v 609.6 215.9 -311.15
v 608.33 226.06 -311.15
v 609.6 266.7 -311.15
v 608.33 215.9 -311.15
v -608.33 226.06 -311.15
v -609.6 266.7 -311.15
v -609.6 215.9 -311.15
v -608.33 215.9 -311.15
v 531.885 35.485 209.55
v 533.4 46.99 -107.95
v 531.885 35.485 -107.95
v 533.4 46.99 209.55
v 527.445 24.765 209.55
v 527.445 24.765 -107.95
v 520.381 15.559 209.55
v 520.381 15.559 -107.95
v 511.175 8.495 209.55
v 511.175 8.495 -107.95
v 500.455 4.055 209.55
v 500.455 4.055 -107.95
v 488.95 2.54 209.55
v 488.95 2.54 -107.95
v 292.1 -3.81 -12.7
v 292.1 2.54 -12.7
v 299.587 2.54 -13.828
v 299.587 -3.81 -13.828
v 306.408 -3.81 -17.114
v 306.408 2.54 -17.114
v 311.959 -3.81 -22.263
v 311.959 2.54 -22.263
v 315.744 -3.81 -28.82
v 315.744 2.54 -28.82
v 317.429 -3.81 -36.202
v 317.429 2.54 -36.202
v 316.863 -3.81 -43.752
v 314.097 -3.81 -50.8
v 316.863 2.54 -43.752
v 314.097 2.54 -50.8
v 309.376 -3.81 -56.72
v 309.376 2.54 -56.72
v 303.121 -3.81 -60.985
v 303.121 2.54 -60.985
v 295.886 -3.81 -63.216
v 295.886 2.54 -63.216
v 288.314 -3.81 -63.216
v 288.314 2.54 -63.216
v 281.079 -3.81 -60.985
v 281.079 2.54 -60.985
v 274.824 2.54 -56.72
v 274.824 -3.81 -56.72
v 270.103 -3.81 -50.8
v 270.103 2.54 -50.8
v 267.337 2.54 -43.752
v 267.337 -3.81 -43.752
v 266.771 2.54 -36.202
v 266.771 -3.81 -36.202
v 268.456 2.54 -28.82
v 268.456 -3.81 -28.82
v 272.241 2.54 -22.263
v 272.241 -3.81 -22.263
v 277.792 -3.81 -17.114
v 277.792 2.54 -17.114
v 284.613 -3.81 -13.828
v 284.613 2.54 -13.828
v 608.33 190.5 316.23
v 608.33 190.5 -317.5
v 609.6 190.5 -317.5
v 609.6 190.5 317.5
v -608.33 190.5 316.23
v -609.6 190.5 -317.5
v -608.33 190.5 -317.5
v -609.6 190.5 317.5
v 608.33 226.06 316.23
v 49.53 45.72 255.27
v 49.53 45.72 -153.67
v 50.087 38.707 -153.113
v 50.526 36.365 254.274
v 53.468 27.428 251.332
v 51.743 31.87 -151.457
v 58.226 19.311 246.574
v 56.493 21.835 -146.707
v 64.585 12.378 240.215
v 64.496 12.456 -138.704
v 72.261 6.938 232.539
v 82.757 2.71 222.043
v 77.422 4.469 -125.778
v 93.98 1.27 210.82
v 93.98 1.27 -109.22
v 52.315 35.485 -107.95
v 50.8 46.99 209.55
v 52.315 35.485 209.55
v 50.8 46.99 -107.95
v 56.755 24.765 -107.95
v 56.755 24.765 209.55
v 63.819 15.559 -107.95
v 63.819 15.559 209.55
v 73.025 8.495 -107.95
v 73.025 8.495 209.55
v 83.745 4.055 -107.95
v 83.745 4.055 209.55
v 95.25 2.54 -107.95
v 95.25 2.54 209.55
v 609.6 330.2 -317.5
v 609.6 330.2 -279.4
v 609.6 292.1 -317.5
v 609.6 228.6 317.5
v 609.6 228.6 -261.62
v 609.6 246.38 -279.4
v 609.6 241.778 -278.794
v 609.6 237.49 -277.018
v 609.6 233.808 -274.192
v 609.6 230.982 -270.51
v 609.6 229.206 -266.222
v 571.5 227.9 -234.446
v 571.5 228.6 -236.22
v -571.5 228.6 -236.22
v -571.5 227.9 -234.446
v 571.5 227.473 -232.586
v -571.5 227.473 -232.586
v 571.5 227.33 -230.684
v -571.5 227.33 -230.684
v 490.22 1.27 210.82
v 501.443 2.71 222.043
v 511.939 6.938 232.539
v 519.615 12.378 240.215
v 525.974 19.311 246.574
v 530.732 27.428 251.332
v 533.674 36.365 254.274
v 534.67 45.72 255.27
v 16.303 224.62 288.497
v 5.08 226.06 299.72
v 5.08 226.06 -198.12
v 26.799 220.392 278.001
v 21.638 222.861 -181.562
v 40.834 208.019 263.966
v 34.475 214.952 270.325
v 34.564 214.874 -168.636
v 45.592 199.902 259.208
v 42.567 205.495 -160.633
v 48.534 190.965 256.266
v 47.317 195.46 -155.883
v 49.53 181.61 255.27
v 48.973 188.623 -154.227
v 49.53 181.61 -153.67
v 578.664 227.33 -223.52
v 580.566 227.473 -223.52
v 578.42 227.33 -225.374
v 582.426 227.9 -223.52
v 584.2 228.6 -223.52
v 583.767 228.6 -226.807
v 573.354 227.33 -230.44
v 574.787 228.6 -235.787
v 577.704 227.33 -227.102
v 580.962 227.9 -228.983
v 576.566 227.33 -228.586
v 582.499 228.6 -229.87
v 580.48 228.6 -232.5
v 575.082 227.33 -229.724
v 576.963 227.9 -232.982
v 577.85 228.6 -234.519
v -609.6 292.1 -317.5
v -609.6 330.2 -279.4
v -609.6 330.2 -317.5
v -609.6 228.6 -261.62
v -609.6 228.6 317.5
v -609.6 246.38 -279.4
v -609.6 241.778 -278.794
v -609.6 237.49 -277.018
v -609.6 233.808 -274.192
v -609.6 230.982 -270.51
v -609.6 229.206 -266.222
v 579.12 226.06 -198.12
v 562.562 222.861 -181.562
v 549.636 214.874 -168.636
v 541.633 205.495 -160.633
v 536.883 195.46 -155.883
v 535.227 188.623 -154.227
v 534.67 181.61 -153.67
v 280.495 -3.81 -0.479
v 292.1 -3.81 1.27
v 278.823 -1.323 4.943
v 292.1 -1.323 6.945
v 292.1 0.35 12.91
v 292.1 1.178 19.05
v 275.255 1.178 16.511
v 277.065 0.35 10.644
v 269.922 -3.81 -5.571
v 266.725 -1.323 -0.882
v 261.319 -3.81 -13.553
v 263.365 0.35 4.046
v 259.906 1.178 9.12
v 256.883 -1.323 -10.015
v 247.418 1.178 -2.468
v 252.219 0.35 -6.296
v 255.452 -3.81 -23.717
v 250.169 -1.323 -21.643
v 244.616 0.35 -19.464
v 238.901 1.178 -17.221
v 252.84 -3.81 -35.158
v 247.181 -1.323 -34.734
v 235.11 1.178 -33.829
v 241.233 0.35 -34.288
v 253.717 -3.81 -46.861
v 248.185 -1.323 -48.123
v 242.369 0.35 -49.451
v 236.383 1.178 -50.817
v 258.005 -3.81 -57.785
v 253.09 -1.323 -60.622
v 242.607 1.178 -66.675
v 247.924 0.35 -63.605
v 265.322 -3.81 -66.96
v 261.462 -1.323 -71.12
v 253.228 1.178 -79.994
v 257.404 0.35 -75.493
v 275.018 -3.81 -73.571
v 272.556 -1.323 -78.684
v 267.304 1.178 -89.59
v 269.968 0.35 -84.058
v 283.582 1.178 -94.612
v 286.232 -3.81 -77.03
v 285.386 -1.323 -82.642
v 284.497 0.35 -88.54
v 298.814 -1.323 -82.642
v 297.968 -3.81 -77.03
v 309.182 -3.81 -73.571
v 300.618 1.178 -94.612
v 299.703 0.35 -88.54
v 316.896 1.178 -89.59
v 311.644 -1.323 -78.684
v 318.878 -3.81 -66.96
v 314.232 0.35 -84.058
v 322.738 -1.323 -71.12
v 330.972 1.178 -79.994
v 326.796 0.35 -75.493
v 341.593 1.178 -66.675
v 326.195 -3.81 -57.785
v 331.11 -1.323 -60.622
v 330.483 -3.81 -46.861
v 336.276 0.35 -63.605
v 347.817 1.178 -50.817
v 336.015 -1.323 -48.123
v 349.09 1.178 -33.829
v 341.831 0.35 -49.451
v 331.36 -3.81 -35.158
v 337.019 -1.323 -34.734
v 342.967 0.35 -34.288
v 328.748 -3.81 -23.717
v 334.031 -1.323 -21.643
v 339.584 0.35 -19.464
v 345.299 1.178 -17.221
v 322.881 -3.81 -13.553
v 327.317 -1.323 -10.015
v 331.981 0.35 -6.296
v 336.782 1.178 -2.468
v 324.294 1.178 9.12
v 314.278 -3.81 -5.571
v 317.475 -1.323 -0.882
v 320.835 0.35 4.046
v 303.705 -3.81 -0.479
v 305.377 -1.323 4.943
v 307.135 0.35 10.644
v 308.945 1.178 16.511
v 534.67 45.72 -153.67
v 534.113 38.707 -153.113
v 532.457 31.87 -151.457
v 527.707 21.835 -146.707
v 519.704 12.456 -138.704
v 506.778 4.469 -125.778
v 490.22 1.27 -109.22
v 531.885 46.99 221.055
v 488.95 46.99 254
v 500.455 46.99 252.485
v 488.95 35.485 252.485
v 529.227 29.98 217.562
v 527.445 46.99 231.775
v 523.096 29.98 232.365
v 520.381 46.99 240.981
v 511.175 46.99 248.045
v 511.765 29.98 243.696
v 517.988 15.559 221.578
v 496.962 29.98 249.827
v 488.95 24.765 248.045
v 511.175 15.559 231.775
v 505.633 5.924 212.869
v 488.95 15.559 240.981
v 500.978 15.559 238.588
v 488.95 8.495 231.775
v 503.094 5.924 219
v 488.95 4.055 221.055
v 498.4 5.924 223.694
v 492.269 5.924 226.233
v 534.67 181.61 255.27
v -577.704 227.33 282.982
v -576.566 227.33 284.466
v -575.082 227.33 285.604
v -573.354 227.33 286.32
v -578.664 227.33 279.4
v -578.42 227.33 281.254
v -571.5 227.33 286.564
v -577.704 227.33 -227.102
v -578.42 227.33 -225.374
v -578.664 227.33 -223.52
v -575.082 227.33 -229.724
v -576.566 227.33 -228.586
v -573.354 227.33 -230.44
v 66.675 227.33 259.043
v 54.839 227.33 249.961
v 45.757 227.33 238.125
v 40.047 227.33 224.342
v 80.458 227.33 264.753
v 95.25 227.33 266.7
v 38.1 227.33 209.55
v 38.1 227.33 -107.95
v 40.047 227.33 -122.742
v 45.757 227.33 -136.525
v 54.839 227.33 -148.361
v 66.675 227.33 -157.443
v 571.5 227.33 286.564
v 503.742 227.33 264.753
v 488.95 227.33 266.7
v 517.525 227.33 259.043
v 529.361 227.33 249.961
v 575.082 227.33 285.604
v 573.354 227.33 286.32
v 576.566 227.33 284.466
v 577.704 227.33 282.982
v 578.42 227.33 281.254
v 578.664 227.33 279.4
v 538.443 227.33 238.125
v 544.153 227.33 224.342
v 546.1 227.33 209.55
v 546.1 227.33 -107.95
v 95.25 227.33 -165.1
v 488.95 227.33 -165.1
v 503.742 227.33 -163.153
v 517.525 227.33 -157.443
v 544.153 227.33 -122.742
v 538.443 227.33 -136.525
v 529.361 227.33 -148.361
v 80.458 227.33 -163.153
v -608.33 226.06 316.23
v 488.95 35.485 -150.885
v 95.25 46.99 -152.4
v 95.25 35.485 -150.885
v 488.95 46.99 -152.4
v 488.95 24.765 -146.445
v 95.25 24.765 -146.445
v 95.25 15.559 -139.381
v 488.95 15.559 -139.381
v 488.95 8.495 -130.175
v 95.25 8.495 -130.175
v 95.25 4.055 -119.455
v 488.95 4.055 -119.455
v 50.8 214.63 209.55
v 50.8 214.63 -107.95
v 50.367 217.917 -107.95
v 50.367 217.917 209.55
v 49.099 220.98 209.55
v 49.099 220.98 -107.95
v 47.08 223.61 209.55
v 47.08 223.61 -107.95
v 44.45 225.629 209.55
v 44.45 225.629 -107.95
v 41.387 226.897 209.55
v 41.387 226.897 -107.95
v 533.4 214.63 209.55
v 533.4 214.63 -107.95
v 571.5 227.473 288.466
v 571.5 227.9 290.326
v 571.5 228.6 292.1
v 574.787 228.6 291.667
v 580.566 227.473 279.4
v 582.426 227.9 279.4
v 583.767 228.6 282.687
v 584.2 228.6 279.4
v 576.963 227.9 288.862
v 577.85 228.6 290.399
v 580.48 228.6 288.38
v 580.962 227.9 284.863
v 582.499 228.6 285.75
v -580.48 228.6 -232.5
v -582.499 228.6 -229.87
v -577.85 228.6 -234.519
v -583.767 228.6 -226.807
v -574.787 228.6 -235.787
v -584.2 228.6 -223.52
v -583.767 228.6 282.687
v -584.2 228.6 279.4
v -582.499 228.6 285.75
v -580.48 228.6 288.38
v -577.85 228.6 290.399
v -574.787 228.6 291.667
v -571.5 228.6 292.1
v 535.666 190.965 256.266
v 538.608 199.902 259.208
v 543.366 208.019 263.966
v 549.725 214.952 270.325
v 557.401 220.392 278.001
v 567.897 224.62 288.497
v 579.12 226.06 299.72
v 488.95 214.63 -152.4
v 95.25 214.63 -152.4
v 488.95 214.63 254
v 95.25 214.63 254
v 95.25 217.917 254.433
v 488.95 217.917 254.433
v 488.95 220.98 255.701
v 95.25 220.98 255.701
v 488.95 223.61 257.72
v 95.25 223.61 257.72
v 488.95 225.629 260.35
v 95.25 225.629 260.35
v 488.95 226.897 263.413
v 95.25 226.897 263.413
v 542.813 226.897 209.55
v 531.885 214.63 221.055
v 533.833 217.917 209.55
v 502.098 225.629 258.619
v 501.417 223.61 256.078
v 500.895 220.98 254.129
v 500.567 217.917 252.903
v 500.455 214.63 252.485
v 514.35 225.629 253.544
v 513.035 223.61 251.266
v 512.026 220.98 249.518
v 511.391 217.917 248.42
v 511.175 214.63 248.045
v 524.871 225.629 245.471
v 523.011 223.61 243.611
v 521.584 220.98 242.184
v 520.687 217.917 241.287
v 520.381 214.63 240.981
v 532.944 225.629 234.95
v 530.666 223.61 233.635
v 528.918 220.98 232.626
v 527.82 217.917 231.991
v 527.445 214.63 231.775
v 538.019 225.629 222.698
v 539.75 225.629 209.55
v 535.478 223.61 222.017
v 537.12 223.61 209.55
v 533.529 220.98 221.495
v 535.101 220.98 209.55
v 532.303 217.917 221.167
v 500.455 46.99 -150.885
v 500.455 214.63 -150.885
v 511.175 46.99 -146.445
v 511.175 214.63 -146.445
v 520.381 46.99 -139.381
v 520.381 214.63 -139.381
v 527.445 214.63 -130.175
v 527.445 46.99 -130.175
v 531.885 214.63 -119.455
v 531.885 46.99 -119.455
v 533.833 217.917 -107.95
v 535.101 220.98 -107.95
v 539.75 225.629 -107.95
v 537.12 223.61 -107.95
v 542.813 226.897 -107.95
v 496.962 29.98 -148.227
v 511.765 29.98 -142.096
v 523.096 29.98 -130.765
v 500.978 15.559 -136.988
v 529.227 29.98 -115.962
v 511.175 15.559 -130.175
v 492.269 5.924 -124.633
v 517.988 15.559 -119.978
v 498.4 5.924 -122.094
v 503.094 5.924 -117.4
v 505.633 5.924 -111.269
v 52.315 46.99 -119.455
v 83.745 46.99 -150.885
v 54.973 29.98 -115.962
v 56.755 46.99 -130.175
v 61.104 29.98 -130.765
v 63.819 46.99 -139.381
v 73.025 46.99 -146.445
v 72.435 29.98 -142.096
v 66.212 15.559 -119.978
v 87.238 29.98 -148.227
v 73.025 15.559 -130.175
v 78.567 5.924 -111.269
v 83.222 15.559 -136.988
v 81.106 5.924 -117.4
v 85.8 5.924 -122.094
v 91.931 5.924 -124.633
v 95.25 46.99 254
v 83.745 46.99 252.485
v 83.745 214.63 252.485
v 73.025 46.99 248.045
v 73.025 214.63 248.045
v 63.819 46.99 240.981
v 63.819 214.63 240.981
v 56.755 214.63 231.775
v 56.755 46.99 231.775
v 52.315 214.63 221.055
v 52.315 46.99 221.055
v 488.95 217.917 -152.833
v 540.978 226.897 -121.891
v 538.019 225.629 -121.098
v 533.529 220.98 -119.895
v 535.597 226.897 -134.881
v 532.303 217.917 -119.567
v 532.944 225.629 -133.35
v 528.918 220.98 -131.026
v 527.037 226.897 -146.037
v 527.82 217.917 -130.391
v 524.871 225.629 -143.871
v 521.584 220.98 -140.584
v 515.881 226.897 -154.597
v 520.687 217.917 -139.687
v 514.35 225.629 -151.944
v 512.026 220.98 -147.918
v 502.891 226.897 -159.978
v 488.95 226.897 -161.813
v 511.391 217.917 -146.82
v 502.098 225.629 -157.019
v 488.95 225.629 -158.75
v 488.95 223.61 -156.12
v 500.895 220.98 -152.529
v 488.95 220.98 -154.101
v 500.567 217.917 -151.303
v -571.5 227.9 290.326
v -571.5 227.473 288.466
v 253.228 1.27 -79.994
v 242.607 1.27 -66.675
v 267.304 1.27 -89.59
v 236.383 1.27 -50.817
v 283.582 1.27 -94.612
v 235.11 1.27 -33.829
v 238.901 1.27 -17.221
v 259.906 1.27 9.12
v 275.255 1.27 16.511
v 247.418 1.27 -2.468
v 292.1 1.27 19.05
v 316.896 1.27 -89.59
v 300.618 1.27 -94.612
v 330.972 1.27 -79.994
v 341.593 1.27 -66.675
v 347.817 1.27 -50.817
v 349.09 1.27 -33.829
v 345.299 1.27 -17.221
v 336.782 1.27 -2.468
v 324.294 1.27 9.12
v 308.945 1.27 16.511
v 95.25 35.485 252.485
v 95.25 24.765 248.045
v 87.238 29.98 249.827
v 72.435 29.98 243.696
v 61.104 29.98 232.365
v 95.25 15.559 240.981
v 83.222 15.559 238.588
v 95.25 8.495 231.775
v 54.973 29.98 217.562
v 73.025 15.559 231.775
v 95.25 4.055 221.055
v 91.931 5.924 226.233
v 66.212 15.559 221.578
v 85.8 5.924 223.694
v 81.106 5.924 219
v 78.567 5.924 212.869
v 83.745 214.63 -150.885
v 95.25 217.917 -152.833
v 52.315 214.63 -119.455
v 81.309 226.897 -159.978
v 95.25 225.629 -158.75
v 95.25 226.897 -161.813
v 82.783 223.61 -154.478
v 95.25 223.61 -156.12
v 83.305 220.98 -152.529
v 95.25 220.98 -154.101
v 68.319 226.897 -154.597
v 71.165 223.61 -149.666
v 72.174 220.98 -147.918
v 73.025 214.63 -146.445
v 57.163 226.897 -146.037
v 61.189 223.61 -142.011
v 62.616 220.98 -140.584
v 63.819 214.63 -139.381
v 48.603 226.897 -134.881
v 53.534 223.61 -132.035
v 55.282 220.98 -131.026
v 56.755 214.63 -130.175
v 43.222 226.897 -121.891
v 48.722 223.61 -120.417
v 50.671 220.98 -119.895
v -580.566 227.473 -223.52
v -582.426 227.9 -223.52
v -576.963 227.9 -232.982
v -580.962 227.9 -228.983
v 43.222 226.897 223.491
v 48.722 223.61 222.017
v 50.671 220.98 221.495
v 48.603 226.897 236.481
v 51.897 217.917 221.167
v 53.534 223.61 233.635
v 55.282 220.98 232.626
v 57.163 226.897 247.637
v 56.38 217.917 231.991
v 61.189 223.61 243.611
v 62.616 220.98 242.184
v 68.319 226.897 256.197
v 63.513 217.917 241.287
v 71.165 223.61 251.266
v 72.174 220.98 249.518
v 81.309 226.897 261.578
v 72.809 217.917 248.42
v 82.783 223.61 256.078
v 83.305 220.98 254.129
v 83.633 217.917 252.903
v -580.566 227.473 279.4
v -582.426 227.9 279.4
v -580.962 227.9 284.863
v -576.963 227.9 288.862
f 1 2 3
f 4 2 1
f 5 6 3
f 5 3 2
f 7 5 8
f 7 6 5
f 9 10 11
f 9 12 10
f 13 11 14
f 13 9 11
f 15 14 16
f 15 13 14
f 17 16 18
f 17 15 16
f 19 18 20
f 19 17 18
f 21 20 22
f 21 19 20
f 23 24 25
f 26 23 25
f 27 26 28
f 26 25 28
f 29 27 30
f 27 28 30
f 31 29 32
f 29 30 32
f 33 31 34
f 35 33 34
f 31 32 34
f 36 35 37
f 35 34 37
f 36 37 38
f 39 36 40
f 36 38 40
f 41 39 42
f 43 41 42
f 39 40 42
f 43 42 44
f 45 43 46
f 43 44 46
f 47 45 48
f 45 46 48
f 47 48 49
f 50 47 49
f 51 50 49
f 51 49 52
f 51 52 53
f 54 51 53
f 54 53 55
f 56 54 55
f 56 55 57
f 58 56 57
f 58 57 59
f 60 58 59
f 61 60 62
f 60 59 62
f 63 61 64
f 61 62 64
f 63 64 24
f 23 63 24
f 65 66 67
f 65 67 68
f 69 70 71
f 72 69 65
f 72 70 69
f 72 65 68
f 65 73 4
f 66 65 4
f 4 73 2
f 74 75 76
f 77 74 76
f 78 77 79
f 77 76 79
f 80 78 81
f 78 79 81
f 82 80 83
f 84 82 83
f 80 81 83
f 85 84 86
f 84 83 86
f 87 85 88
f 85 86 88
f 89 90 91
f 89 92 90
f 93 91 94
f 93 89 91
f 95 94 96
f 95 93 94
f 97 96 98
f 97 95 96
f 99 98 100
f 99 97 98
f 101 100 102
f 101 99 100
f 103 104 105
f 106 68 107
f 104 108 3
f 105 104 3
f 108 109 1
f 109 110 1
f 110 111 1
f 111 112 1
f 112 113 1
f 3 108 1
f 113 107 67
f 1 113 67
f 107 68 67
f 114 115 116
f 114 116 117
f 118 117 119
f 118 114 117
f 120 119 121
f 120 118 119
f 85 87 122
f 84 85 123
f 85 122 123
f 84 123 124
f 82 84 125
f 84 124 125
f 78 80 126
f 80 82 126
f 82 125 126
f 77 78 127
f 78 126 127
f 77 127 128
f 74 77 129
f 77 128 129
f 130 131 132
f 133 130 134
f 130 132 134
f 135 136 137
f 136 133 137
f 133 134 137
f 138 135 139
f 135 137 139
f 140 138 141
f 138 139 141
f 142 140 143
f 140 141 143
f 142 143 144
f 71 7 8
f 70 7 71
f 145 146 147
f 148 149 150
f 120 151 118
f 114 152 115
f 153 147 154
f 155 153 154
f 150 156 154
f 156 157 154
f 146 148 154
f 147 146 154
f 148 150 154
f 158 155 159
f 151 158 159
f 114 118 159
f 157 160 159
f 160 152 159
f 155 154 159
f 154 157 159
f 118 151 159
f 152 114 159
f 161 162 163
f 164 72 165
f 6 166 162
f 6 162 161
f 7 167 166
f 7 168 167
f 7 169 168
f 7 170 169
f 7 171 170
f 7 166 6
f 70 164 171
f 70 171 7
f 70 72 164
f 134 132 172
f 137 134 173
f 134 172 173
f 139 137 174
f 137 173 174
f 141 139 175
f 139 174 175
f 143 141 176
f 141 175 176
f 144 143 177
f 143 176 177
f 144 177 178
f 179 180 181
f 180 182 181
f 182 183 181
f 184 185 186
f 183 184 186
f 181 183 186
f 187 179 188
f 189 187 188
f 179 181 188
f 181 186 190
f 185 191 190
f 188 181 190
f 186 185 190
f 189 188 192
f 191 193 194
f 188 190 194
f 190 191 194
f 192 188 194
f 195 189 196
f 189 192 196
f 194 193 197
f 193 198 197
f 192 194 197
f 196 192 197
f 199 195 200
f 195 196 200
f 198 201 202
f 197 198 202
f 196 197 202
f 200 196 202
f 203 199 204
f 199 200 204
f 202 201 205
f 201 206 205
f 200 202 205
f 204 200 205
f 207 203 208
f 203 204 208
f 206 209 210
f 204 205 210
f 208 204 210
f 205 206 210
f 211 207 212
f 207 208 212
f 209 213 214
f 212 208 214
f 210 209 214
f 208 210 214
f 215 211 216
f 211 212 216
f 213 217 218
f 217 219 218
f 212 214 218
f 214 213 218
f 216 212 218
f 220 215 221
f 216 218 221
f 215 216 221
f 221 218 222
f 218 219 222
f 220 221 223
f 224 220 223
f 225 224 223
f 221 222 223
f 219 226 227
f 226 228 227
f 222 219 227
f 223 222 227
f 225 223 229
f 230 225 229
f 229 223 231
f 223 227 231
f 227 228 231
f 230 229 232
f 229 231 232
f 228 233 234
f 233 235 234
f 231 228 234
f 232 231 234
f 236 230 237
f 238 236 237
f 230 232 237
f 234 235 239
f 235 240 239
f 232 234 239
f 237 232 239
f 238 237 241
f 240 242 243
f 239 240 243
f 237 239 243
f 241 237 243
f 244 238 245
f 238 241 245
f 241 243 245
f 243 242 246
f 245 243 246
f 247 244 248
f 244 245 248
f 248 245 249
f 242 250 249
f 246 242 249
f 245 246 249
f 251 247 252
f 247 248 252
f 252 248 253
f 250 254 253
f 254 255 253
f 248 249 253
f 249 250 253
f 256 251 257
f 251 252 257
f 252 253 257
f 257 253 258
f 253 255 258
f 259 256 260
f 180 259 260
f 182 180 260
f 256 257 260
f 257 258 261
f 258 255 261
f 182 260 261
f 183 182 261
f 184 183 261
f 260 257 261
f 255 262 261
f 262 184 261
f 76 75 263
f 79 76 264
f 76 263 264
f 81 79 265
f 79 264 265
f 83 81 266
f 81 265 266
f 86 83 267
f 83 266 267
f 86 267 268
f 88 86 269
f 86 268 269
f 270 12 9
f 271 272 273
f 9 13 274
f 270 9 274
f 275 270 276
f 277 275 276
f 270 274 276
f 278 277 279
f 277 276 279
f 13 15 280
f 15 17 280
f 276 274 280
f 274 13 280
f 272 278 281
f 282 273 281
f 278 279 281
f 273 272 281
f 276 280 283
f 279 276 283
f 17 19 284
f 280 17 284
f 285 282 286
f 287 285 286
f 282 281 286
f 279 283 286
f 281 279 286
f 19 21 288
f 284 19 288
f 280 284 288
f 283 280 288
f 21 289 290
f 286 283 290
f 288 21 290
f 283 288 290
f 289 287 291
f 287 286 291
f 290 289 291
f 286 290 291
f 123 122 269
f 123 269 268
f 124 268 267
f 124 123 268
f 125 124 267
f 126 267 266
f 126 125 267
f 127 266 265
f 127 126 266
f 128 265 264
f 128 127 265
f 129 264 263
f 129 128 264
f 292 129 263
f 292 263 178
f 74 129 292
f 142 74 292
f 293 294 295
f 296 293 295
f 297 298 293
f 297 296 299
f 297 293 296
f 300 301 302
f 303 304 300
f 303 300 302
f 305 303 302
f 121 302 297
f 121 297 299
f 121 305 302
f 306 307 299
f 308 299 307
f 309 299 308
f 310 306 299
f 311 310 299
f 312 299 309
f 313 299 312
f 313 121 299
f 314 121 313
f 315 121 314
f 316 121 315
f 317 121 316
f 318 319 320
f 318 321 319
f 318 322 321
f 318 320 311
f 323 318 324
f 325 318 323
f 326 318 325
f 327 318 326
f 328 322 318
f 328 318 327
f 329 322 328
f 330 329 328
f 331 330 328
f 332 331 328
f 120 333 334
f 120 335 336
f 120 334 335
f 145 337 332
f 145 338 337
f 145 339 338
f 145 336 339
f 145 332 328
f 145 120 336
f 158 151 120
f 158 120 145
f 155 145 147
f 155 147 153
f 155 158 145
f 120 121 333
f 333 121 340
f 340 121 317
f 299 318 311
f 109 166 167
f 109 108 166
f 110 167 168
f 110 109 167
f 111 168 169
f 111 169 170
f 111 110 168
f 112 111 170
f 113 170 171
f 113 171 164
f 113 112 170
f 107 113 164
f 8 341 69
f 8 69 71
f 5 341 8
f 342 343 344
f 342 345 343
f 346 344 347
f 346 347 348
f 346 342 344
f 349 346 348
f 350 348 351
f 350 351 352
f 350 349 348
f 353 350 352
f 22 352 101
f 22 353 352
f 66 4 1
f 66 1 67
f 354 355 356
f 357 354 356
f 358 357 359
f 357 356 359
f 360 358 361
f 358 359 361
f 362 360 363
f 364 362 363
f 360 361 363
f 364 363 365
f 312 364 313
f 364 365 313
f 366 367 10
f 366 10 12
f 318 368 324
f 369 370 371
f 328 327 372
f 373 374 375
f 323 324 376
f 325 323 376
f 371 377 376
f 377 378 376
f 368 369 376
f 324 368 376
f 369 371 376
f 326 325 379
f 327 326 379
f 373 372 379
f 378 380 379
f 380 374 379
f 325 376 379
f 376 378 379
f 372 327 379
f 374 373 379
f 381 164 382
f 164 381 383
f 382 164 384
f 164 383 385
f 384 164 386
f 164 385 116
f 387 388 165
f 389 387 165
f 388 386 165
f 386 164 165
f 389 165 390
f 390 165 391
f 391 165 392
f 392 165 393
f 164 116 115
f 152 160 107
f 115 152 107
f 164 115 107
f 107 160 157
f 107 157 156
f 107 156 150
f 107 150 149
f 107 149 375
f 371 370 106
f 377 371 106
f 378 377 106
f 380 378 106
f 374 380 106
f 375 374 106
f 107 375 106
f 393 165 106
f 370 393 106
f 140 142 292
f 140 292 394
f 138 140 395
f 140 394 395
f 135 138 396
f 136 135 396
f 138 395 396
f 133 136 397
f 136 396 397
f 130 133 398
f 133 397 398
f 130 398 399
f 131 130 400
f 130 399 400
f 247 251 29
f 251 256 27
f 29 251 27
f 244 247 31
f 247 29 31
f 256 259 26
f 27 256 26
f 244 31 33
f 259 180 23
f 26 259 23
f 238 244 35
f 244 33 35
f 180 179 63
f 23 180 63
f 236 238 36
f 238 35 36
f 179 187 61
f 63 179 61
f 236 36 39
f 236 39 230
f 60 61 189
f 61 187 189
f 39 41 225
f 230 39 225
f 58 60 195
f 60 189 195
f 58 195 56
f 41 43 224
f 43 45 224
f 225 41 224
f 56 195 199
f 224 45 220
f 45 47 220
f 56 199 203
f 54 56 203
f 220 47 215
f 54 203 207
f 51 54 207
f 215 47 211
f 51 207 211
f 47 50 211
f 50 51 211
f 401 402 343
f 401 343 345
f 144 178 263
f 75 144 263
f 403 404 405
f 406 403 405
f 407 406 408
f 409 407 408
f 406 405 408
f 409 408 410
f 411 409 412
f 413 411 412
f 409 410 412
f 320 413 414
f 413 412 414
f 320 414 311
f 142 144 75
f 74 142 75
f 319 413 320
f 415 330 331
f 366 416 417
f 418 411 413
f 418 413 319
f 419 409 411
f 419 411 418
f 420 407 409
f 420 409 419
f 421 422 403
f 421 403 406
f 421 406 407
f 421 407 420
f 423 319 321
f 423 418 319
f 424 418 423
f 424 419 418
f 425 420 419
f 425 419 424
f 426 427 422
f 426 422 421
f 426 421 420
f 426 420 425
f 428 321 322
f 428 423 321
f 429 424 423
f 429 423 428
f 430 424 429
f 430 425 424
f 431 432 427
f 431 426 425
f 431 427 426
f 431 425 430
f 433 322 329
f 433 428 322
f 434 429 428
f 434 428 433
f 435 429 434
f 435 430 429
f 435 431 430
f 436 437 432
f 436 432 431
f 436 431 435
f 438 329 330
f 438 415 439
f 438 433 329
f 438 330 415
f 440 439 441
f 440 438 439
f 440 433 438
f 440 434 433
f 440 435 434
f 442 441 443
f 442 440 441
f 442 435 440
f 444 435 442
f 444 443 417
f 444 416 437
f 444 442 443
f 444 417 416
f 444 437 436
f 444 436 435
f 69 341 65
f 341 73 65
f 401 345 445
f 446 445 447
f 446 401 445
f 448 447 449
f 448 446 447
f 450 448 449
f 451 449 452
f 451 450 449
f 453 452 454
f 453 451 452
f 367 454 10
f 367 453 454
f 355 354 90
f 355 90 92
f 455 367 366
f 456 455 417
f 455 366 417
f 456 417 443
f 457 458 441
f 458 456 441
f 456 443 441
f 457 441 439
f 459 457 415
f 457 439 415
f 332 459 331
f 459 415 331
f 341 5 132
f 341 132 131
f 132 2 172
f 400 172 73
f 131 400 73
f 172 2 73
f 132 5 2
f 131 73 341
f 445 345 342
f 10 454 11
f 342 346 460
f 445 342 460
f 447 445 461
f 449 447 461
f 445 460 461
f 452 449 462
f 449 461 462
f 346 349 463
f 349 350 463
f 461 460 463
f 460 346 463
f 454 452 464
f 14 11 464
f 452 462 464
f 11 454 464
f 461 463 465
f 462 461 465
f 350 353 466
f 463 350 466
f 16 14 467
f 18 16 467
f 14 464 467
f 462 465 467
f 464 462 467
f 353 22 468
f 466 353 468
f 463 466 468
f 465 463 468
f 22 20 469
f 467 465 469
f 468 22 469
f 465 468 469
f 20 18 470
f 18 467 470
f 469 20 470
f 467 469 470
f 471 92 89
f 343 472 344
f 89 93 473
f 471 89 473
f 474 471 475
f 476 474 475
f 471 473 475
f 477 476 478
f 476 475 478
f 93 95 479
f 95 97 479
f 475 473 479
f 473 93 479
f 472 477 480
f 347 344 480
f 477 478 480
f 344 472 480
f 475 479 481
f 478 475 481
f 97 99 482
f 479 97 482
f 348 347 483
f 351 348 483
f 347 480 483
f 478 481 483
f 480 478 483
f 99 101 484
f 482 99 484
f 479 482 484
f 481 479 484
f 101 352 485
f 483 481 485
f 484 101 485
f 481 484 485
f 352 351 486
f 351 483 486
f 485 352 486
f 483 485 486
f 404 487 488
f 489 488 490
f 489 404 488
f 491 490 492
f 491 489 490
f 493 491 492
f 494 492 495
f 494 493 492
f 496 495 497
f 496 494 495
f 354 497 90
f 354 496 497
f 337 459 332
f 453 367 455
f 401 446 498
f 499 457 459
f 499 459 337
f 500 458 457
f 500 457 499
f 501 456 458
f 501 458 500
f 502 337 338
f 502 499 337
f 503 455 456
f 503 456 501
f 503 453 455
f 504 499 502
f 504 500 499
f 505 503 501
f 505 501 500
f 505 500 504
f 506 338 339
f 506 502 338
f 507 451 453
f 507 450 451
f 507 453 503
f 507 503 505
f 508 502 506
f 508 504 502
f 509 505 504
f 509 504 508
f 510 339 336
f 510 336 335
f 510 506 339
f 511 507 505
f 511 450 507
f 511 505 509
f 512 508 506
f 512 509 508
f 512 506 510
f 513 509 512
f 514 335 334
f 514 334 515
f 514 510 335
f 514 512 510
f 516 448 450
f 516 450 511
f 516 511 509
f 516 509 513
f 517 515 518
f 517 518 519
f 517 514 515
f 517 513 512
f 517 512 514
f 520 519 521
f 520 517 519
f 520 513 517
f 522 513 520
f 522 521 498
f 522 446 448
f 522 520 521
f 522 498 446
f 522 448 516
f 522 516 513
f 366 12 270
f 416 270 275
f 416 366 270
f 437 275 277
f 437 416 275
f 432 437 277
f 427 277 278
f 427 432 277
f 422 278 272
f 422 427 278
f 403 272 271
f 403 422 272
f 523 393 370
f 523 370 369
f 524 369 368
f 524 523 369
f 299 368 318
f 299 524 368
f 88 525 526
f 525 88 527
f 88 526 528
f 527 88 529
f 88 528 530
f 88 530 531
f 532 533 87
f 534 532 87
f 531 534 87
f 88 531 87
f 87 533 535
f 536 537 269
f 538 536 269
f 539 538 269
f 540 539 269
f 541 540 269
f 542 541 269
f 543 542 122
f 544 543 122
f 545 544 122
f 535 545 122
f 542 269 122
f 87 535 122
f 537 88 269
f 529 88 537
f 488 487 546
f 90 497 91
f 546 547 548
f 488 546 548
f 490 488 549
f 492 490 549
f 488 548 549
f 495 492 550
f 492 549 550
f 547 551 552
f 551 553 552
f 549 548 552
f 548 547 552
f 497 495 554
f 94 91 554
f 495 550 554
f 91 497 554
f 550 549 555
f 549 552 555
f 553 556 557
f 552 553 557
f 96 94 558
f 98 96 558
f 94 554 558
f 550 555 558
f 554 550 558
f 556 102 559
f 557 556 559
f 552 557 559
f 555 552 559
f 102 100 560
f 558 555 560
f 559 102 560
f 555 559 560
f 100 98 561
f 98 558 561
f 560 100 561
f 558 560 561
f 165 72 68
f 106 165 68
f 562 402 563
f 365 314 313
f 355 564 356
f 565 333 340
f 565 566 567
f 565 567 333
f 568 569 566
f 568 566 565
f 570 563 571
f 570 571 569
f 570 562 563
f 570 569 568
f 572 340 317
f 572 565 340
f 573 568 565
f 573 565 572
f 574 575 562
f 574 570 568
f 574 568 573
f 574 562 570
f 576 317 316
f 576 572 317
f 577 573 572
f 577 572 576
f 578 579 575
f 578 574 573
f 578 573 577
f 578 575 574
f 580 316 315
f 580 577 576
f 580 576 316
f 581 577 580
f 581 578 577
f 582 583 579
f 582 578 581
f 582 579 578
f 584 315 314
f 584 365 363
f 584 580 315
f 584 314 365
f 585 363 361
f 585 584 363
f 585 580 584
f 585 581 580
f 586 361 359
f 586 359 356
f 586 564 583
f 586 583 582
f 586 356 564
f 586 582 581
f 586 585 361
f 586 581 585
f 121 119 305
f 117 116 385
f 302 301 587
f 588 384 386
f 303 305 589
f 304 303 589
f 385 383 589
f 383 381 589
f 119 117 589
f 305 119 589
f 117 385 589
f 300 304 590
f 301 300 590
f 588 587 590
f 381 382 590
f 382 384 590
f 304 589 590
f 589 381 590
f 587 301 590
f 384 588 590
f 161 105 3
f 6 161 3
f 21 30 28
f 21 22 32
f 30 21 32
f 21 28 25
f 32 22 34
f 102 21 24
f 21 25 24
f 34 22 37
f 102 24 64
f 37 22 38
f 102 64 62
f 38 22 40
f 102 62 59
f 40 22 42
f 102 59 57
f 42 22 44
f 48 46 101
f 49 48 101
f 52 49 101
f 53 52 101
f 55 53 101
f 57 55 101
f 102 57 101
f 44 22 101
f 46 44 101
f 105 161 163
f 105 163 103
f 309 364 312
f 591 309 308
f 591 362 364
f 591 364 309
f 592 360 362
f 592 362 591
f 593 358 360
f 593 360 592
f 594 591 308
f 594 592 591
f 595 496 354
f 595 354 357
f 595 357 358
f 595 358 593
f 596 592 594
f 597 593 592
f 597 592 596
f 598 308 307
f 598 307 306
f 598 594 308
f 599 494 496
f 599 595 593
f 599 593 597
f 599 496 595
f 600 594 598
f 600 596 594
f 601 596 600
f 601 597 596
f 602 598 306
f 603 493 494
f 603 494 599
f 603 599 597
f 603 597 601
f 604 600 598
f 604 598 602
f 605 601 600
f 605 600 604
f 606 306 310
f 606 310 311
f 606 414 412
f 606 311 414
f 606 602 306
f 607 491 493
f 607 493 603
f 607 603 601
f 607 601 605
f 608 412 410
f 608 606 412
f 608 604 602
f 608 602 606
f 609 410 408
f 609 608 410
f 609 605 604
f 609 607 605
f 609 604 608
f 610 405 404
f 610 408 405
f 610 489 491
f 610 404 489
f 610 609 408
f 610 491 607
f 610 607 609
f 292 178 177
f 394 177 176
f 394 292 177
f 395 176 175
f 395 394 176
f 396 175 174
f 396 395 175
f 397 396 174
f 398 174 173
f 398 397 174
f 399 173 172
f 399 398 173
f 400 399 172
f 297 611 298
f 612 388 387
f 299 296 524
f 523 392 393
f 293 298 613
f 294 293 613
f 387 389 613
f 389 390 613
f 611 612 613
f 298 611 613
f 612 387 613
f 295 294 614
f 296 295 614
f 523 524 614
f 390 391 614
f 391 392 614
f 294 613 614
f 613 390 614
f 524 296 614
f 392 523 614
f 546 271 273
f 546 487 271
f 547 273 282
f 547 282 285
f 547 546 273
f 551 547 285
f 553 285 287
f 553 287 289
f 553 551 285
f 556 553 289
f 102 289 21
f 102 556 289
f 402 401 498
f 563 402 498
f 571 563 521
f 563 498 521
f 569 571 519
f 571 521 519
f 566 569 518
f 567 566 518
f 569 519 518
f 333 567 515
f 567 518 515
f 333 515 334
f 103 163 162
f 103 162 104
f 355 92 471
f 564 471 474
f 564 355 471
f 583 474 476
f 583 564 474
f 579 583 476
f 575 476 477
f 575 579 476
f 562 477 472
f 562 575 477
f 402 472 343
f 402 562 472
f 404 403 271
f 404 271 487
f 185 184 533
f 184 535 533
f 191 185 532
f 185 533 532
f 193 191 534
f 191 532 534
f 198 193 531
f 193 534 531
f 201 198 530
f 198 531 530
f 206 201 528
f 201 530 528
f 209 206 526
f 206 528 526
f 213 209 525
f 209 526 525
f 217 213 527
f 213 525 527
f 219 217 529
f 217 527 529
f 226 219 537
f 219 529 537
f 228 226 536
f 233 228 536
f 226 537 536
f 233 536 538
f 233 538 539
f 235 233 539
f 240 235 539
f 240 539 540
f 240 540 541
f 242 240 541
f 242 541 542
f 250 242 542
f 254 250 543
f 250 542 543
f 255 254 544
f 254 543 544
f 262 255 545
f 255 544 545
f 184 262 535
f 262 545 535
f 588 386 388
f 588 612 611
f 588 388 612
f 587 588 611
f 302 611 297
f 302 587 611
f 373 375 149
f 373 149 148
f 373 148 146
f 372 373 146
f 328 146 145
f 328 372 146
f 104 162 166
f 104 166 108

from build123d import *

# Parameters (mm, degrees)
SKETCH1_W           = 1219.2
SKETCH1_H           = 635
BOSS_EXTRUDE2_DEPTH = 330.2
SKETCH3_W           = 1219.2
SKETCH3_H           = 101.6
CUT_EXTRUDE1_DEPTH  = 596.9
FILLET2_R           = 17.78
CUT_EXTRUDE2_DEPTH  = 226.06
FILLET4_R           = 44.45
CUT_EXTRUDE3_DEPTH  = 1.27
FILLET5_R           = 12.7
CUT_EXTRUDE4_DEPTH  = 608.33
CUT_EXTRUDE6_DEPTH  = 316.23
SKETCH12_W          = 635
SKETCH12_H          = 190.5
CUT_EXTRUDE7_DEPTH  = 2.54
SKETCH13_W          = 635
SKETCH13_H          = 190.5
CUT_EXTRUDE8_DEPTH  = 2.54
SKETCH15_R          = 25.4
CUT_EXTRUDE9_DEPTH  = 6.35
CUT_EXTRUDE10_START = -1219.2
CUT_EXTRUDE10_DEPTH = 1219.2


with BuildPart() as part:
    # Sketch1 → Boss-Extrude2 (new body)
    with BuildSketch(Plane(origin=(0, 0, 0), x_dir=(1, 0, 0), z_dir=(0, 1, 0))):
        Rectangle(SKETCH1_W, SKETCH1_H)
    extrude(amount=BOSS_EXTRUDE2_DEPTH)

    # Sketch3 → Cut-Extrude1 (cut)
    with BuildSketch(Plane.XY.offset(317.5)):
        with Locations((0, 279.4)):
            Rectangle(SKETCH3_W, SKETCH3_H)
    extrude(amount=-CUT_EXTRUDE1_DEPTH, mode=Mode.SUBTRACT)

    # Fillet2
    fillet2_edges = [part.edges().sort_by_distance(p)[0] for p in [
        (0, 228.6, -279.4),
    ]]
    fillet(fillet2_edges, radius=FILLET2_R)

    # Sketch5 → Cut-Extrude2 (cut)
    with BuildSketch(Plane(origin=(0, 228.6, 0), x_dir=(1, 0, 0), z_dir=(0, 1, 0))):
        with BuildLine():
            Line((95.25, 152.4), (488.95, 152.4))
            ThreePointArc((488.95, 152.4), (520.380896424, 139.380896424), (533.4, 107.95))
            Line((533.4, 107.95), (533.4, -209.55))
            ThreePointArc((533.4, -209.55), (520.380896424, -240.980896424), (488.95, -254))
            Line((488.95, -254), (95.25, -254))
            ThreePointArc((95.25, -254), (63.819103576, -240.980896424), (50.8, -209.55))
            Line((50.8, -209.55), (50.8, 107.95))
            ThreePointArc((50.8, 107.95), (63.819103576, 139.380896424), (95.25, 152.4))
        make_face()
    extrude(amount=-CUT_EXTRUDE2_DEPTH, mode=Mode.SUBTRACT)

    # Fillet4
    fillet4_edges = [part.edges().sort_by_distance(p)[0] for p in [
        (520.380896424, 2.54, -139.380896424),
        (533.4, 2.54, 50.8),
        (520.380896424, 2.54, 240.980896424),
        (292.1, 2.54, 254),
        (63.819103576, 2.54, 240.980896424),
        (50.8, 2.54, 50.8),
        (63.819103576, 2.54, -139.380896424),
        (292.1, 2.54, -152.4),
    ]]
    fillet(fillet4_edges, radius=FILLET4_R)

    # Sketch7 → Cut-Extrude3 (cut)
    with BuildSketch(Plane(origin=(0, 228.6, 0), x_dir=(1, 0, 0), z_dir=(0, 1, 0))):
        with BuildLine():
            Line((-571.5, -292.1), (571.5, -292.1))
            ThreePointArc((571.5, -292.1), (580.480256121, -288.380256121), (584.2, -279.4))
            Line((584.2, -279.4), (584.2, 223.52))
            ThreePointArc((584.2, 223.52), (580.480256121, 232.500256121), (571.5, 236.22))
            Line((571.5, 236.22), (-571.5, 236.22))
            ThreePointArc((-571.5, 236.22), (-580.480256121, 232.500256121), (-584.2, 223.52))
            Line((-584.2, 223.52), (-584.2, -279.4))
            ThreePointArc((-584.2, -279.4), (-580.480256121, -288.380256121), (-571.5, -292.1))
        make_face()
    extrude(amount=-CUT_EXTRUDE3_DEPTH, mode=Mode.SUBTRACT)

    # Fillet5
    # the kernel refuses this fillet: 12.7 mm, written as the material it adds along each edge
    with BuildSketch(Plane(origin=(-571.5, 227.33, 292.1), x_dir=(0, 0, -1), z_dir=(1, 0, 0)), Plane(origin=(571.5, 227.33, -236.22), x_dir=(0, 0, 1), z_dir=(-1, 0, 0))) as fillet5_piece_1:
        with BuildLine():
            CenterArc((5.535801658, 12.7), FILLET5_R, 244.158067237, 25.841932763)
            Line((0, 1.27), (0, 0))
            Line((0, 0), (5.535801658, 0))
        make_face()
    extrude(amount=1143)
    with BuildSketch(Plane(origin=(-571.5, 227.33, 279.4), x_dir=(-1, 0, 0), z_dir=(0, 0, -1))) as fillet5_piece_2:
        with BuildLine():
            CenterArc((7.164198342, 12.7), FILLET5_R, 270, 25.841932763)
            Line((12.7, 1.27), (12.7, 0))
            Line((12.7, 0), (7.164198342, 0))
        make_face()
    revolve(axis=Axis((-571.5, 227.33, 279.4), (0, 1, 0)), revolution_arc=90)
    with BuildSketch(Plane(origin=(-584.2, 227.33, -223.52), x_dir=(1, 0, 0), z_dir=(0, 0, 1)), Plane(origin=(584.2, 227.33, 279.4), x_dir=(-1, 0, 0), z_dir=(0, 0, -1))) as fillet5_piece_3:
        with BuildLine():
            CenterArc((5.535801658, 12.7), FILLET5_R, 244.158067237, 25.841932763)
            Line((0, 1.27), (0, 0))
            Line((0, 0), (5.535801658, 0))
        make_face()
    extrude(amount=502.92)
    with BuildSketch(Plane(origin=(-571.5, 227.33, -223.52), x_dir=(0, 0, -1), z_dir=(1, 0, 0))) as fillet5_piece_4:
        with BuildLine():
            CenterArc((7.164198342, 12.7), FILLET5_R, 270, 25.841932763)
            Line((12.7, 1.27), (12.7, 0))
            Line((12.7, 0), (7.164198342, 0))
        make_face()
    revolve(axis=Axis((-571.5, 227.33, -223.52), (0, 1, 0)), revolution_arc=90)
    with BuildSketch(Plane(origin=(571.5, 227.33, -223.52), x_dir=(1, 0, 0), z_dir=(0, 0, 1))) as fillet5_piece_5:
        with BuildLine():
            CenterArc((7.164198342, 12.7), FILLET5_R, 270, 25.841932763)
            Line((12.7, 1.27), (12.7, 0))
            Line((12.7, 0), (7.164198342, 0))
        make_face()
    revolve(axis=Axis((571.5, 227.33, -223.52), (0, 1, 0)), revolution_arc=90)
    with BuildSketch(Plane(origin=(571.5, 227.33, 279.4), x_dir=(0, 0, 1), z_dir=(-1, 0, 0))) as fillet5_piece_6:
        with BuildLine():
            CenterArc((7.164198342, 12.7), FILLET5_R, 270, 25.841932763)
            Line((12.7, 1.27), (12.7, 0))
            Line((12.7, 0), (7.164198342, 0))
        make_face()
    revolve(axis=Axis((571.5, 227.33, 279.4), (0, 1, 0)), revolution_arc=90)
    # the kernel refuses this fillet: 12.7 mm, written as the material it takes off along each edge
    with BuildSketch(Plane(origin=(488.95, 227.33, -107.95), x_dir=(1, 0, 0), z_dir=(0, 0, 1))) as fillet5_2_piece_1:
        with BuildLine():
            CenterArc((44.45 + FILLET5_R, -FILLET5_R), FILLET5_R, 90, 90)
            Line((44.45, -FILLET5_R), (44.45, 0))
            Line((44.45, 0), (44.45 + FILLET5_R, 0))
        make_face()
    revolve(axis=Axis((488.95, 227.33, -107.95), (0, 1, 0)), revolution_arc=90, mode=Mode.SUBTRACT)
    with BuildSketch(Plane(origin=(488.95, 227.33, -152.4), x_dir=(0, 0, -1), z_dir=(-1, 0, 0)), Plane(origin=(95.25, 227.33, 254), x_dir=(0, 0, 1), z_dir=(1, 0, 0))) as fillet5_2_piece_2:
        with BuildLine():
            CenterArc((FILLET5_R, FILLET5_R), FILLET5_R, 180, 90)
            Line((0, FILLET5_R), (0, 0))
            Line((0, 0), (FILLET5_R, 0))
        make_face()
    extrude(amount=393.7, mode=Mode.SUBTRACT)
    with BuildSketch(Plane(origin=(95.25, 227.33, -107.95), x_dir=(0, 0, -1), z_dir=(1, 0, 0))) as fillet5_2_piece_3:
        with BuildLine():
            CenterArc((44.45 + FILLET5_R, -FILLET5_R), FILLET5_R, 90, 90)
            Line((44.45, -FILLET5_R), (44.45, 0))
            Line((44.45, 0), (44.45 + FILLET5_R, 0))
        make_face()
    revolve(axis=Axis((95.25, 227.33, -107.95), (0, 1, 0)), revolution_arc=90, mode=Mode.SUBTRACT)
    with BuildSketch(Plane(origin=(50.8, 227.33, -107.95), x_dir=(0, -1, 0), z_dir=(0, 0, 1))) as fillet5_2_piece_4:
        with BuildLine():
            CenterArc((FILLET5_R, -FILLET5_R), FILLET5_R, 90, 90)
            Line((0, -FILLET5_R), (0, 0))
            Line((0, 0), (FILLET5_R, 0))
        make_face()
    extrude(amount=317.5, mode=Mode.SUBTRACT)
    with BuildSketch(Plane(origin=(95.25, 227.33, 209.55), x_dir=(-1, 0, 0), z_dir=(0, 0, -1))) as fillet5_2_piece_5:
        with BuildLine():
            CenterArc((44.45 + FILLET5_R, -FILLET5_R), FILLET5_R, 90, 90)
            Line((44.45, -FILLET5_R), (44.45, 0))
            Line((44.45, 0), (44.45 + FILLET5_R, 0))
        make_face()
    revolve(axis=Axis((95.25, 227.33, 209.55), (0, 1, 0)), revolution_arc=90, mode=Mode.SUBTRACT)
    with BuildSketch(Plane(origin=(488.95, 227.33, 209.55), x_dir=(0, 0, 1), z_dir=(-1, 0, 0))) as fillet5_2_piece_6:
        with BuildLine():
            CenterArc((44.45 + FILLET5_R, -FILLET5_R), FILLET5_R, 90, 90)
            Line((44.45, -FILLET5_R), (44.45, 0))
            Line((44.45, 0), (44.45 + FILLET5_R, 0))
        make_face()
    revolve(axis=Axis((488.95, 227.33, 209.55), (0, 1, 0)), revolution_arc=90, mode=Mode.SUBTRACT)
    with BuildSketch(Plane(origin=(533.4, 227.33, 209.55), x_dir=(1, 0, 0), z_dir=(0, 0, -1))) as fillet5_2_piece_7:
        with BuildLine():
            CenterArc((FILLET5_R, FILLET5_R), FILLET5_R, 180, 90)
            Line((0, FILLET5_R), (0, 0))
            Line((0, 0), (FILLET5_R, 0))
        make_face()
    extrude(amount=317.5, mode=Mode.SUBTRACT)

    # Sketch9 → Cut-Extrude4 (cut, symmetric)
    with BuildSketch(Plane(origin=(0, 0, 0), x_dir=(0, 0, -1), z_dir=(1, 0, 0))):
        with BuildLine():
            Line((317.5, 226.06), (198.12, 226.06))
            ThreePointArc((198.12, 226.06), (166.689103576, 213.040896424), (153.67, 181.61))
            Line((153.67, 181.61), (153.67, 45.72))
            ThreePointArc((153.67, 45.72), (140.650896424, 14.289103576), (109.22, 1.27))
            Line((109.22, 1.27), (-210.82, 1.27))
            ThreePointArc((-210.82, 1.27), (-242.250896424, 14.289103576), (-255.27, 45.72))
            Line((-255.27, 45.72), (-255.27, 181.61))
            ThreePointArc((-255.27, 181.61), (-268.289103576, 213.040896424), (-299.72, 226.06))
            Line((-299.72, 226.06), (-316.23, 226.06))
            Line((-316.23, 226.06), (-316.23, 190.5))
            Line((-316.23, 190.5), (-317.5, 190.5))
            Line((-317.5, 190.5), (-317.5, 0))
            Line((-317.5, 0), (317.5, 0))
            Line((317.5, 0), (317.5, 226.06))
        make_face()
    extrude(amount=CUT_EXTRUDE4_DEPTH, both=True, mode=Mode.SUBTRACT)

    # Sketch11 → Cut-Extrude6 (cut, symmetric)
    with BuildSketch(Plane.XY):
        with BuildLine():
            Line((-608.33, 226.06), (5.08, 226.06))
            ThreePointArc((5.08, 226.06), (36.510896424, 213.040896424), (49.53, 181.61))
            Line((49.53, 181.61), (49.53, 45.72))
            ThreePointArc((49.53, 45.72), (62.549103576, 14.289103576), (93.98, 1.27))
            Line((93.98, 1.27), (-608.33, 1.27))
            Line((-608.33, 1.27), (-608.33, 226.06))
        make_face()
        with BuildLine():
            Line((534.67, 45.72), (534.67, 181.61))
            ThreePointArc((534.67, 181.61), (547.689103576, 213.040896424), (579.12, 226.06))
            Line((579.12, 226.06), (608.33, 226.06))
            Line((608.33, 226.06), (608.33, 1.27))
            Line((608.33, 1.27), (490.22, 1.27))
            ThreePointArc((490.22, 1.27), (521.650896424, 14.289103576), (534.67, 45.72))
        make_face()
    extrude(amount=CUT_EXTRUDE6_DEPTH, both=True, mode=Mode.SUBTRACT)

    # Sketch12 → Cut-Extrude7 (cut)
    with BuildSketch(Plane.ZY.offset(609.6)):
        with Locations((0, 95.25)):
            Rectangle(SKETCH12_W, SKETCH12_H)
    extrude(amount=-CUT_EXTRUDE7_DEPTH, mode=Mode.SUBTRACT)

    # Sketch13 → Cut-Extrude8 (cut)
    with BuildSketch(Plane(origin=(609.6, 0, 0), x_dir=(0, 0, -1), z_dir=(1, 0, 0))):
        with Locations((0, 95.25)):
            Rectangle(SKETCH13_W, SKETCH13_H)
    extrude(amount=-CUT_EXTRUDE8_DEPTH, mode=Mode.SUBTRACT)

    # Sketch16 → Revolve1 (revolve)
    with BuildSketch(Plane(origin=(292.1, 0, 0), x_dir=(0, 0, -1), z_dir=(1, 0, 0)), mode=Mode.PRIVATE) as revolve1_sk:
        with BuildLine():
            Line((38.1, 1.27), (38.1, -3.81))
            Line((38.1, -3.81), (77.47, -3.81))
            ThreePointArc((77.47, -3.81), (86.098103461, -0.38238846), (95.25, 1.178213968))
            Line((95.25, 1.178213968), (95.25, 1.27))
            Line((95.25, 1.27), (38.1, 1.27))
        make_face()
    revolve(revolve1_sk.sketch.rotate(Axis((292.1, 1.27, -38.1), (0, -1, 0)), 180), axis=Axis((292.1, 1.27, -38.1), (0, -1, 0)))

    # Sketch15 → Cut-Extrude9 (cut)
    with BuildSketch(Plane(origin=(0, 2.54, 0), x_dir=(1, 0, 0), z_dir=(0, 1, 0))):
        with Locations(Location((292.1, 38.1, 0), (0, 0, 270))):
            Circle(SKETCH15_R)
    extrude(amount=-CUT_EXTRUDE9_DEPTH, mode=Mode.SUBTRACT)

    # Sketch17 → Cut-Extrude10 (cut)
    with BuildSketch(Plane(origin=(609.6, 0, 0), x_dir=(0, 0, -1), z_dir=(1, 0, 0)).offset(CUT_EXTRUDE10_START)):
        Polygon((317.5, 292.1), (311.15, 266.7), (311.15, 215.9), (317.5, 190.5), align=None)
    extrude(amount=CUT_EXTRUDE10_DEPTH, mode=Mode.SUBTRACT)


solid = part.part
